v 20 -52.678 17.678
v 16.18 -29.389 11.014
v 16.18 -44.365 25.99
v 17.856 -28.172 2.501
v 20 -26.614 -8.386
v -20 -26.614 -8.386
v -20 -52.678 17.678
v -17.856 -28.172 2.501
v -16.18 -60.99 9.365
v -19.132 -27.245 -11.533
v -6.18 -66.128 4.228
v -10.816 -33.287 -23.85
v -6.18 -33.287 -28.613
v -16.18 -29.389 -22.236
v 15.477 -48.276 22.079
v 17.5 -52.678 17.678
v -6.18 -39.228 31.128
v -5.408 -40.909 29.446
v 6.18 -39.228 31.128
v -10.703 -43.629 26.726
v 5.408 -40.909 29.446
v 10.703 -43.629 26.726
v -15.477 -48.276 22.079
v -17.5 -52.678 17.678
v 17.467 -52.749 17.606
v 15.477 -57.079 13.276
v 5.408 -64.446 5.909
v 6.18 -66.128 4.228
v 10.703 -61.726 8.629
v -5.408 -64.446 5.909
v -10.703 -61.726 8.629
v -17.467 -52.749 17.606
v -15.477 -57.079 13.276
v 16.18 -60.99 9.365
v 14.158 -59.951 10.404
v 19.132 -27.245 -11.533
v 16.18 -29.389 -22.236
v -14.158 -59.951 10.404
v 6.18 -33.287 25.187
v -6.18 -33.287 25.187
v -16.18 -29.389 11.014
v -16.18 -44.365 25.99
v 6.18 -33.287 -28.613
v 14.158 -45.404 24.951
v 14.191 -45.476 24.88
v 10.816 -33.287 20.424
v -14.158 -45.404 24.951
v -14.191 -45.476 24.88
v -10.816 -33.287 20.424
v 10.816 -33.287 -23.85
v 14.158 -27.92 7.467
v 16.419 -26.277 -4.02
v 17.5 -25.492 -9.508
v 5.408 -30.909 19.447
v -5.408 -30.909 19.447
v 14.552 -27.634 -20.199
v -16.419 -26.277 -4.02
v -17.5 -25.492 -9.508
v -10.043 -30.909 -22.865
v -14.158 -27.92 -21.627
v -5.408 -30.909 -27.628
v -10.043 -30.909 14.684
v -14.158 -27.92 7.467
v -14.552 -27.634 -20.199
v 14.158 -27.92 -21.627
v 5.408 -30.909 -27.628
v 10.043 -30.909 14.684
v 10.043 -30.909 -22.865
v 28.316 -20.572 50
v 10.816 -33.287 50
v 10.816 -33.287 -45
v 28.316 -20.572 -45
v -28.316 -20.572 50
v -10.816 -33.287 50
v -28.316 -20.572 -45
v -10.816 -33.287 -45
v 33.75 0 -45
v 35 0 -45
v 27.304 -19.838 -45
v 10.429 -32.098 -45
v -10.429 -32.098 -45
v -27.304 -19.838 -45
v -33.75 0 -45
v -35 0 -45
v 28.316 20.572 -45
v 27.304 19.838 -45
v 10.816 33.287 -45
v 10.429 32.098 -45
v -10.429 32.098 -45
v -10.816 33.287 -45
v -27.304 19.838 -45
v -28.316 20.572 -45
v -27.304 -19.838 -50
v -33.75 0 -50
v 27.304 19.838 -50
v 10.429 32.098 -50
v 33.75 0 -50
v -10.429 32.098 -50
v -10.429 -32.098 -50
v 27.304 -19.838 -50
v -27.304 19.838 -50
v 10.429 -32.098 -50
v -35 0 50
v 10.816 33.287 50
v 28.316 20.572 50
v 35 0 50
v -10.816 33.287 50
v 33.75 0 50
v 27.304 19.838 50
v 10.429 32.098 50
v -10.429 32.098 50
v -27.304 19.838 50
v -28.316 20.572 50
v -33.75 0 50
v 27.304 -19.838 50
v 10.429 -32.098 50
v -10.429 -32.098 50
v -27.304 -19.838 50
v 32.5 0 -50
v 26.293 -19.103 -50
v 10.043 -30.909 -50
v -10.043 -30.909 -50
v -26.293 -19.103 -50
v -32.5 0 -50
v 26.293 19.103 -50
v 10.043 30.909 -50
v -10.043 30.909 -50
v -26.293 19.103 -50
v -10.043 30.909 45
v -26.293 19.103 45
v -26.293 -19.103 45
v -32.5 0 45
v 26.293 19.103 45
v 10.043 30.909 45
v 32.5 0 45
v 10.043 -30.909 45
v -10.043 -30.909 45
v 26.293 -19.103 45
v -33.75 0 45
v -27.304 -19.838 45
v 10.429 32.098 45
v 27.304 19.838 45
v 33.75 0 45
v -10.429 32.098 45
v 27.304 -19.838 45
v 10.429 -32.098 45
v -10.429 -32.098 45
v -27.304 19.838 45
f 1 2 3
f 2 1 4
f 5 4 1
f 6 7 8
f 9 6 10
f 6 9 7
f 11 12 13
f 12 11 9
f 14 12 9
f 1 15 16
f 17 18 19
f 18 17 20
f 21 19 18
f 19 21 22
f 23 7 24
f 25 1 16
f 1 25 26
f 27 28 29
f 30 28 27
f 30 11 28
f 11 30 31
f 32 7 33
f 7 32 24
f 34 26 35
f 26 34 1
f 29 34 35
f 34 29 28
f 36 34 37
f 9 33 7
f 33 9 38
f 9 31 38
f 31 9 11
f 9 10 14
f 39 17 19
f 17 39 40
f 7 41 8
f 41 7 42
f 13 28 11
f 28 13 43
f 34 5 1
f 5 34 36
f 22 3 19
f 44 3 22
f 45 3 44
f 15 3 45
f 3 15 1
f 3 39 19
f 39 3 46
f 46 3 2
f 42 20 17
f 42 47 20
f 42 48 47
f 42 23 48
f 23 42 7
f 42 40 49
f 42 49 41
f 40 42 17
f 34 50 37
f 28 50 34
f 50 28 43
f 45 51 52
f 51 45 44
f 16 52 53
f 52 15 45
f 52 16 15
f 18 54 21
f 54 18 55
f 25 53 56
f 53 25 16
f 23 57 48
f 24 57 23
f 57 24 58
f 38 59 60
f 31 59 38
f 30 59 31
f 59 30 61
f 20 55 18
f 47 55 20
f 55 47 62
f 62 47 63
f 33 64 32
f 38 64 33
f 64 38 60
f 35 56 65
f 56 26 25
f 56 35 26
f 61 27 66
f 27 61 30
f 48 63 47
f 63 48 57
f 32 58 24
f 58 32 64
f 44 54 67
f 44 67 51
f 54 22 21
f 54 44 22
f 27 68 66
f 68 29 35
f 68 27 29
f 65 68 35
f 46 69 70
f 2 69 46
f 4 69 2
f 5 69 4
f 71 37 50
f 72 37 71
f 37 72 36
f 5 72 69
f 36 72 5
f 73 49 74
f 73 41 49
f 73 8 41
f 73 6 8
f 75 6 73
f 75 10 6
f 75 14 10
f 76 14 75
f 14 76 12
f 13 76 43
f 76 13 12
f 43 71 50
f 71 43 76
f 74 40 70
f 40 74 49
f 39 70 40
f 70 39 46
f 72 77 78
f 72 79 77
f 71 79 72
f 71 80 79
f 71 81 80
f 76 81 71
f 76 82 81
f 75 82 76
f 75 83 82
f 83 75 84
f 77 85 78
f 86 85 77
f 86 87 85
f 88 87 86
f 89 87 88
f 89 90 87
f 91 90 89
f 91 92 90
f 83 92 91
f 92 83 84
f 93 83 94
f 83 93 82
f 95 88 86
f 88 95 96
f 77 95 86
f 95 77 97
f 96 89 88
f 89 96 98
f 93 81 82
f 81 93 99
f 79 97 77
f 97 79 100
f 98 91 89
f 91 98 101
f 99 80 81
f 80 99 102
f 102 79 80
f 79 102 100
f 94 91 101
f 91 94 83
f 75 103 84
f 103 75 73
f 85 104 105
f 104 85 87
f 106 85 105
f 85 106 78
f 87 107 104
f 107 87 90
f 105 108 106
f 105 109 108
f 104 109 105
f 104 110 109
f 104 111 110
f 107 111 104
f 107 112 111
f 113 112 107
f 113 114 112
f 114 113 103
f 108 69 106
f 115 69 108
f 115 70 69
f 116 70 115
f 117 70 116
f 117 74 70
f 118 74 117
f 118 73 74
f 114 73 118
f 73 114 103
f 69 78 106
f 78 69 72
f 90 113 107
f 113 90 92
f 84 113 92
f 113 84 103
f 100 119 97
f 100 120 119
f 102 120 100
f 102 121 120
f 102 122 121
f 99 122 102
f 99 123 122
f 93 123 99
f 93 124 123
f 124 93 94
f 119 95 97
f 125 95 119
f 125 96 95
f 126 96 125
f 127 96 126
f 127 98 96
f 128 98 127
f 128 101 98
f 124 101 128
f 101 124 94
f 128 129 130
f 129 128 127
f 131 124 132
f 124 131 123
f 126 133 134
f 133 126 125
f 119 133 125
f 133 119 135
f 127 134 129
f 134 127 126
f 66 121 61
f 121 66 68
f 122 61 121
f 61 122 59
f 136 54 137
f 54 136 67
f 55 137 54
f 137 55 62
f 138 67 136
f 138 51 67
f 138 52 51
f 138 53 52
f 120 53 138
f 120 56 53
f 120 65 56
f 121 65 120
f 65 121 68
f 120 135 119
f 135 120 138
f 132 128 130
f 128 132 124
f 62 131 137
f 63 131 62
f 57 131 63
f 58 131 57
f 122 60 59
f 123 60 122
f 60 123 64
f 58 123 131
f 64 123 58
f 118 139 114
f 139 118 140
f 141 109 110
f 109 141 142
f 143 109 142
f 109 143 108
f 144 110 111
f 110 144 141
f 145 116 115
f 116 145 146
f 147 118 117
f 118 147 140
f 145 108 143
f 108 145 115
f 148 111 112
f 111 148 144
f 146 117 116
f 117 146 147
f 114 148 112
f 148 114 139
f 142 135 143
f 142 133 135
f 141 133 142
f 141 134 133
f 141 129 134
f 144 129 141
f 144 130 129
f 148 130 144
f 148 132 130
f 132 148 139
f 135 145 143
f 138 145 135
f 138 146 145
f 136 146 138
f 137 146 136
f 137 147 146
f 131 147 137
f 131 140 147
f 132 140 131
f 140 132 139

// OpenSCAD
// file: x-way.scad
/* [Render] */
$fa=1;
$fs=0.4;
$fn=10;
$show_helpers = false;

/* [General] */
$wall_thickness = 2.5;

/* [Main Body] */
$main_height = 100;
$main_radius = 35;
$joining_height = 10;
$joining_radius = $main_radius - $wall_thickness / 2;

/* [Tubes] */
$tube_height = $main_height / 2;
$tube_radius = $main_radius - 15;
$tube_hole_dimensions = 15;
$tube_hole_offset = 0;

// Parts
module main_body() {
    difference() {
        // Cylinder
        main_body_outer();
        main_body_inner();

        // Top joining
        translate([0, 0, $main_height/2]) cylinder(h = $joining_height, r = $joining_radius, center = true);

        // Bottom joining
        translate([0, 0, -$main_height/2])
        difference() {
            cylinder(h = $joining_height, r = $main_radius + 1, center = true);
            cylinder(h = $joining_height, r = $joining_radius, center = true);
        }
    }
}

module main_body_outer() {
    cylinder(h = $main_height, r = $main_radius, center = true);
}

module main_body_inner() {
    cylinder(h = $main_height + 1, r = $main_radius - $wall_thickness, center = true);
}

module tube_body(r, t) {
    difference() {
        difference() {
            tube_body_outer(r, t);
            tube_body_inner(r, t);
        }
        main_body_outer();
    }
}

module tube_body_outer(r, t) {
    translate(t) {
        rotate(r) {
            cylinder(h = $tube_height, r = $tube_radius, center = true);
        }
    }
}

module tube_body_inner(r, t) {
    translate(t) {
        rotate(r) {
            cylinder(h = $tube_height + 1, r = $tube_radius - $wall_thickness, center = true);
        }
    }
}

// Assembled modules

module xWay(count) {
    $max_angle = 180;
    $per_item = $max_angle / count;
    
    if(count > 0) {
        for (i = [0 : count - 1]) {
            rotate([0, 0, i * $per_item * 2]) tube_body([45, 0, 0], [0, -$main_radius, 0]);
        }
    }

    difference() {
        main_body();
        if(count > 0) {
            for (i = [0 : count - 1]) {
                rotate([0, 0, i * $per_item * 2]) tube_body_inner([45, 0, 0], [0, -$main_radius, 0]);
            }
        }
    }
}
// main file
use <x-way.scad>;

/*  Check settings ("customizer variables") in x-way.scad.
    The current config is pre-defined for a 150x150x150mm printing area.
    To tweak use one of the following:
    1. via OpenSCAD's Command-Line
        Use the `--D` flag to change variables.
        E.g. `--D $fn=100` to make the circles smooth.
    2. via OpenSCAD GUI
        Open this file and check the Customizer panel.
        In case the variables don't show up, proceed to the 3rd option.
    3. via an Editor (or OpenSCAD GUI)
        Open the file from above (`use <THIS FILE.scad>`) in either 
        an Editor or OpenSCAD GUI and change the variables in code
        or inside the Customizer. 
        Afterwards (re-)open this file in OpenSCAD and see the changes.

        Note: Editing the variables inside the code will affect ALL models
        depending on it. This can have advantages, but also disadvantages.
*/

// --- 

xWay(1);
